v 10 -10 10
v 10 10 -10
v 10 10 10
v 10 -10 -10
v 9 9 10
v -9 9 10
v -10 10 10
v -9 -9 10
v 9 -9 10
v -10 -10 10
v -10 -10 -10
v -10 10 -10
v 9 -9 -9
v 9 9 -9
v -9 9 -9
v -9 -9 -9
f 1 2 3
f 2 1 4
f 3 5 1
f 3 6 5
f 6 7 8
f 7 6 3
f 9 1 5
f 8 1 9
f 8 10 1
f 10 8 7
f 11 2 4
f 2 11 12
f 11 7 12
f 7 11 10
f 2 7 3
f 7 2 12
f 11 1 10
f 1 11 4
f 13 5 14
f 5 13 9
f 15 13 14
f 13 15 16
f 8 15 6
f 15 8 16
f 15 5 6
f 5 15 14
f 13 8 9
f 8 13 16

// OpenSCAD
width = 20;
height = 20;
depth = 20;
wall_thickness = 1;
difference() {
  cube([width, depth, height], center=true);

  translate([0, 0, wall_thickness]){
    cube([(width - 2 * wall_thickness), (depth - 2 * wall_thickness), height], center=true);
  }
}
